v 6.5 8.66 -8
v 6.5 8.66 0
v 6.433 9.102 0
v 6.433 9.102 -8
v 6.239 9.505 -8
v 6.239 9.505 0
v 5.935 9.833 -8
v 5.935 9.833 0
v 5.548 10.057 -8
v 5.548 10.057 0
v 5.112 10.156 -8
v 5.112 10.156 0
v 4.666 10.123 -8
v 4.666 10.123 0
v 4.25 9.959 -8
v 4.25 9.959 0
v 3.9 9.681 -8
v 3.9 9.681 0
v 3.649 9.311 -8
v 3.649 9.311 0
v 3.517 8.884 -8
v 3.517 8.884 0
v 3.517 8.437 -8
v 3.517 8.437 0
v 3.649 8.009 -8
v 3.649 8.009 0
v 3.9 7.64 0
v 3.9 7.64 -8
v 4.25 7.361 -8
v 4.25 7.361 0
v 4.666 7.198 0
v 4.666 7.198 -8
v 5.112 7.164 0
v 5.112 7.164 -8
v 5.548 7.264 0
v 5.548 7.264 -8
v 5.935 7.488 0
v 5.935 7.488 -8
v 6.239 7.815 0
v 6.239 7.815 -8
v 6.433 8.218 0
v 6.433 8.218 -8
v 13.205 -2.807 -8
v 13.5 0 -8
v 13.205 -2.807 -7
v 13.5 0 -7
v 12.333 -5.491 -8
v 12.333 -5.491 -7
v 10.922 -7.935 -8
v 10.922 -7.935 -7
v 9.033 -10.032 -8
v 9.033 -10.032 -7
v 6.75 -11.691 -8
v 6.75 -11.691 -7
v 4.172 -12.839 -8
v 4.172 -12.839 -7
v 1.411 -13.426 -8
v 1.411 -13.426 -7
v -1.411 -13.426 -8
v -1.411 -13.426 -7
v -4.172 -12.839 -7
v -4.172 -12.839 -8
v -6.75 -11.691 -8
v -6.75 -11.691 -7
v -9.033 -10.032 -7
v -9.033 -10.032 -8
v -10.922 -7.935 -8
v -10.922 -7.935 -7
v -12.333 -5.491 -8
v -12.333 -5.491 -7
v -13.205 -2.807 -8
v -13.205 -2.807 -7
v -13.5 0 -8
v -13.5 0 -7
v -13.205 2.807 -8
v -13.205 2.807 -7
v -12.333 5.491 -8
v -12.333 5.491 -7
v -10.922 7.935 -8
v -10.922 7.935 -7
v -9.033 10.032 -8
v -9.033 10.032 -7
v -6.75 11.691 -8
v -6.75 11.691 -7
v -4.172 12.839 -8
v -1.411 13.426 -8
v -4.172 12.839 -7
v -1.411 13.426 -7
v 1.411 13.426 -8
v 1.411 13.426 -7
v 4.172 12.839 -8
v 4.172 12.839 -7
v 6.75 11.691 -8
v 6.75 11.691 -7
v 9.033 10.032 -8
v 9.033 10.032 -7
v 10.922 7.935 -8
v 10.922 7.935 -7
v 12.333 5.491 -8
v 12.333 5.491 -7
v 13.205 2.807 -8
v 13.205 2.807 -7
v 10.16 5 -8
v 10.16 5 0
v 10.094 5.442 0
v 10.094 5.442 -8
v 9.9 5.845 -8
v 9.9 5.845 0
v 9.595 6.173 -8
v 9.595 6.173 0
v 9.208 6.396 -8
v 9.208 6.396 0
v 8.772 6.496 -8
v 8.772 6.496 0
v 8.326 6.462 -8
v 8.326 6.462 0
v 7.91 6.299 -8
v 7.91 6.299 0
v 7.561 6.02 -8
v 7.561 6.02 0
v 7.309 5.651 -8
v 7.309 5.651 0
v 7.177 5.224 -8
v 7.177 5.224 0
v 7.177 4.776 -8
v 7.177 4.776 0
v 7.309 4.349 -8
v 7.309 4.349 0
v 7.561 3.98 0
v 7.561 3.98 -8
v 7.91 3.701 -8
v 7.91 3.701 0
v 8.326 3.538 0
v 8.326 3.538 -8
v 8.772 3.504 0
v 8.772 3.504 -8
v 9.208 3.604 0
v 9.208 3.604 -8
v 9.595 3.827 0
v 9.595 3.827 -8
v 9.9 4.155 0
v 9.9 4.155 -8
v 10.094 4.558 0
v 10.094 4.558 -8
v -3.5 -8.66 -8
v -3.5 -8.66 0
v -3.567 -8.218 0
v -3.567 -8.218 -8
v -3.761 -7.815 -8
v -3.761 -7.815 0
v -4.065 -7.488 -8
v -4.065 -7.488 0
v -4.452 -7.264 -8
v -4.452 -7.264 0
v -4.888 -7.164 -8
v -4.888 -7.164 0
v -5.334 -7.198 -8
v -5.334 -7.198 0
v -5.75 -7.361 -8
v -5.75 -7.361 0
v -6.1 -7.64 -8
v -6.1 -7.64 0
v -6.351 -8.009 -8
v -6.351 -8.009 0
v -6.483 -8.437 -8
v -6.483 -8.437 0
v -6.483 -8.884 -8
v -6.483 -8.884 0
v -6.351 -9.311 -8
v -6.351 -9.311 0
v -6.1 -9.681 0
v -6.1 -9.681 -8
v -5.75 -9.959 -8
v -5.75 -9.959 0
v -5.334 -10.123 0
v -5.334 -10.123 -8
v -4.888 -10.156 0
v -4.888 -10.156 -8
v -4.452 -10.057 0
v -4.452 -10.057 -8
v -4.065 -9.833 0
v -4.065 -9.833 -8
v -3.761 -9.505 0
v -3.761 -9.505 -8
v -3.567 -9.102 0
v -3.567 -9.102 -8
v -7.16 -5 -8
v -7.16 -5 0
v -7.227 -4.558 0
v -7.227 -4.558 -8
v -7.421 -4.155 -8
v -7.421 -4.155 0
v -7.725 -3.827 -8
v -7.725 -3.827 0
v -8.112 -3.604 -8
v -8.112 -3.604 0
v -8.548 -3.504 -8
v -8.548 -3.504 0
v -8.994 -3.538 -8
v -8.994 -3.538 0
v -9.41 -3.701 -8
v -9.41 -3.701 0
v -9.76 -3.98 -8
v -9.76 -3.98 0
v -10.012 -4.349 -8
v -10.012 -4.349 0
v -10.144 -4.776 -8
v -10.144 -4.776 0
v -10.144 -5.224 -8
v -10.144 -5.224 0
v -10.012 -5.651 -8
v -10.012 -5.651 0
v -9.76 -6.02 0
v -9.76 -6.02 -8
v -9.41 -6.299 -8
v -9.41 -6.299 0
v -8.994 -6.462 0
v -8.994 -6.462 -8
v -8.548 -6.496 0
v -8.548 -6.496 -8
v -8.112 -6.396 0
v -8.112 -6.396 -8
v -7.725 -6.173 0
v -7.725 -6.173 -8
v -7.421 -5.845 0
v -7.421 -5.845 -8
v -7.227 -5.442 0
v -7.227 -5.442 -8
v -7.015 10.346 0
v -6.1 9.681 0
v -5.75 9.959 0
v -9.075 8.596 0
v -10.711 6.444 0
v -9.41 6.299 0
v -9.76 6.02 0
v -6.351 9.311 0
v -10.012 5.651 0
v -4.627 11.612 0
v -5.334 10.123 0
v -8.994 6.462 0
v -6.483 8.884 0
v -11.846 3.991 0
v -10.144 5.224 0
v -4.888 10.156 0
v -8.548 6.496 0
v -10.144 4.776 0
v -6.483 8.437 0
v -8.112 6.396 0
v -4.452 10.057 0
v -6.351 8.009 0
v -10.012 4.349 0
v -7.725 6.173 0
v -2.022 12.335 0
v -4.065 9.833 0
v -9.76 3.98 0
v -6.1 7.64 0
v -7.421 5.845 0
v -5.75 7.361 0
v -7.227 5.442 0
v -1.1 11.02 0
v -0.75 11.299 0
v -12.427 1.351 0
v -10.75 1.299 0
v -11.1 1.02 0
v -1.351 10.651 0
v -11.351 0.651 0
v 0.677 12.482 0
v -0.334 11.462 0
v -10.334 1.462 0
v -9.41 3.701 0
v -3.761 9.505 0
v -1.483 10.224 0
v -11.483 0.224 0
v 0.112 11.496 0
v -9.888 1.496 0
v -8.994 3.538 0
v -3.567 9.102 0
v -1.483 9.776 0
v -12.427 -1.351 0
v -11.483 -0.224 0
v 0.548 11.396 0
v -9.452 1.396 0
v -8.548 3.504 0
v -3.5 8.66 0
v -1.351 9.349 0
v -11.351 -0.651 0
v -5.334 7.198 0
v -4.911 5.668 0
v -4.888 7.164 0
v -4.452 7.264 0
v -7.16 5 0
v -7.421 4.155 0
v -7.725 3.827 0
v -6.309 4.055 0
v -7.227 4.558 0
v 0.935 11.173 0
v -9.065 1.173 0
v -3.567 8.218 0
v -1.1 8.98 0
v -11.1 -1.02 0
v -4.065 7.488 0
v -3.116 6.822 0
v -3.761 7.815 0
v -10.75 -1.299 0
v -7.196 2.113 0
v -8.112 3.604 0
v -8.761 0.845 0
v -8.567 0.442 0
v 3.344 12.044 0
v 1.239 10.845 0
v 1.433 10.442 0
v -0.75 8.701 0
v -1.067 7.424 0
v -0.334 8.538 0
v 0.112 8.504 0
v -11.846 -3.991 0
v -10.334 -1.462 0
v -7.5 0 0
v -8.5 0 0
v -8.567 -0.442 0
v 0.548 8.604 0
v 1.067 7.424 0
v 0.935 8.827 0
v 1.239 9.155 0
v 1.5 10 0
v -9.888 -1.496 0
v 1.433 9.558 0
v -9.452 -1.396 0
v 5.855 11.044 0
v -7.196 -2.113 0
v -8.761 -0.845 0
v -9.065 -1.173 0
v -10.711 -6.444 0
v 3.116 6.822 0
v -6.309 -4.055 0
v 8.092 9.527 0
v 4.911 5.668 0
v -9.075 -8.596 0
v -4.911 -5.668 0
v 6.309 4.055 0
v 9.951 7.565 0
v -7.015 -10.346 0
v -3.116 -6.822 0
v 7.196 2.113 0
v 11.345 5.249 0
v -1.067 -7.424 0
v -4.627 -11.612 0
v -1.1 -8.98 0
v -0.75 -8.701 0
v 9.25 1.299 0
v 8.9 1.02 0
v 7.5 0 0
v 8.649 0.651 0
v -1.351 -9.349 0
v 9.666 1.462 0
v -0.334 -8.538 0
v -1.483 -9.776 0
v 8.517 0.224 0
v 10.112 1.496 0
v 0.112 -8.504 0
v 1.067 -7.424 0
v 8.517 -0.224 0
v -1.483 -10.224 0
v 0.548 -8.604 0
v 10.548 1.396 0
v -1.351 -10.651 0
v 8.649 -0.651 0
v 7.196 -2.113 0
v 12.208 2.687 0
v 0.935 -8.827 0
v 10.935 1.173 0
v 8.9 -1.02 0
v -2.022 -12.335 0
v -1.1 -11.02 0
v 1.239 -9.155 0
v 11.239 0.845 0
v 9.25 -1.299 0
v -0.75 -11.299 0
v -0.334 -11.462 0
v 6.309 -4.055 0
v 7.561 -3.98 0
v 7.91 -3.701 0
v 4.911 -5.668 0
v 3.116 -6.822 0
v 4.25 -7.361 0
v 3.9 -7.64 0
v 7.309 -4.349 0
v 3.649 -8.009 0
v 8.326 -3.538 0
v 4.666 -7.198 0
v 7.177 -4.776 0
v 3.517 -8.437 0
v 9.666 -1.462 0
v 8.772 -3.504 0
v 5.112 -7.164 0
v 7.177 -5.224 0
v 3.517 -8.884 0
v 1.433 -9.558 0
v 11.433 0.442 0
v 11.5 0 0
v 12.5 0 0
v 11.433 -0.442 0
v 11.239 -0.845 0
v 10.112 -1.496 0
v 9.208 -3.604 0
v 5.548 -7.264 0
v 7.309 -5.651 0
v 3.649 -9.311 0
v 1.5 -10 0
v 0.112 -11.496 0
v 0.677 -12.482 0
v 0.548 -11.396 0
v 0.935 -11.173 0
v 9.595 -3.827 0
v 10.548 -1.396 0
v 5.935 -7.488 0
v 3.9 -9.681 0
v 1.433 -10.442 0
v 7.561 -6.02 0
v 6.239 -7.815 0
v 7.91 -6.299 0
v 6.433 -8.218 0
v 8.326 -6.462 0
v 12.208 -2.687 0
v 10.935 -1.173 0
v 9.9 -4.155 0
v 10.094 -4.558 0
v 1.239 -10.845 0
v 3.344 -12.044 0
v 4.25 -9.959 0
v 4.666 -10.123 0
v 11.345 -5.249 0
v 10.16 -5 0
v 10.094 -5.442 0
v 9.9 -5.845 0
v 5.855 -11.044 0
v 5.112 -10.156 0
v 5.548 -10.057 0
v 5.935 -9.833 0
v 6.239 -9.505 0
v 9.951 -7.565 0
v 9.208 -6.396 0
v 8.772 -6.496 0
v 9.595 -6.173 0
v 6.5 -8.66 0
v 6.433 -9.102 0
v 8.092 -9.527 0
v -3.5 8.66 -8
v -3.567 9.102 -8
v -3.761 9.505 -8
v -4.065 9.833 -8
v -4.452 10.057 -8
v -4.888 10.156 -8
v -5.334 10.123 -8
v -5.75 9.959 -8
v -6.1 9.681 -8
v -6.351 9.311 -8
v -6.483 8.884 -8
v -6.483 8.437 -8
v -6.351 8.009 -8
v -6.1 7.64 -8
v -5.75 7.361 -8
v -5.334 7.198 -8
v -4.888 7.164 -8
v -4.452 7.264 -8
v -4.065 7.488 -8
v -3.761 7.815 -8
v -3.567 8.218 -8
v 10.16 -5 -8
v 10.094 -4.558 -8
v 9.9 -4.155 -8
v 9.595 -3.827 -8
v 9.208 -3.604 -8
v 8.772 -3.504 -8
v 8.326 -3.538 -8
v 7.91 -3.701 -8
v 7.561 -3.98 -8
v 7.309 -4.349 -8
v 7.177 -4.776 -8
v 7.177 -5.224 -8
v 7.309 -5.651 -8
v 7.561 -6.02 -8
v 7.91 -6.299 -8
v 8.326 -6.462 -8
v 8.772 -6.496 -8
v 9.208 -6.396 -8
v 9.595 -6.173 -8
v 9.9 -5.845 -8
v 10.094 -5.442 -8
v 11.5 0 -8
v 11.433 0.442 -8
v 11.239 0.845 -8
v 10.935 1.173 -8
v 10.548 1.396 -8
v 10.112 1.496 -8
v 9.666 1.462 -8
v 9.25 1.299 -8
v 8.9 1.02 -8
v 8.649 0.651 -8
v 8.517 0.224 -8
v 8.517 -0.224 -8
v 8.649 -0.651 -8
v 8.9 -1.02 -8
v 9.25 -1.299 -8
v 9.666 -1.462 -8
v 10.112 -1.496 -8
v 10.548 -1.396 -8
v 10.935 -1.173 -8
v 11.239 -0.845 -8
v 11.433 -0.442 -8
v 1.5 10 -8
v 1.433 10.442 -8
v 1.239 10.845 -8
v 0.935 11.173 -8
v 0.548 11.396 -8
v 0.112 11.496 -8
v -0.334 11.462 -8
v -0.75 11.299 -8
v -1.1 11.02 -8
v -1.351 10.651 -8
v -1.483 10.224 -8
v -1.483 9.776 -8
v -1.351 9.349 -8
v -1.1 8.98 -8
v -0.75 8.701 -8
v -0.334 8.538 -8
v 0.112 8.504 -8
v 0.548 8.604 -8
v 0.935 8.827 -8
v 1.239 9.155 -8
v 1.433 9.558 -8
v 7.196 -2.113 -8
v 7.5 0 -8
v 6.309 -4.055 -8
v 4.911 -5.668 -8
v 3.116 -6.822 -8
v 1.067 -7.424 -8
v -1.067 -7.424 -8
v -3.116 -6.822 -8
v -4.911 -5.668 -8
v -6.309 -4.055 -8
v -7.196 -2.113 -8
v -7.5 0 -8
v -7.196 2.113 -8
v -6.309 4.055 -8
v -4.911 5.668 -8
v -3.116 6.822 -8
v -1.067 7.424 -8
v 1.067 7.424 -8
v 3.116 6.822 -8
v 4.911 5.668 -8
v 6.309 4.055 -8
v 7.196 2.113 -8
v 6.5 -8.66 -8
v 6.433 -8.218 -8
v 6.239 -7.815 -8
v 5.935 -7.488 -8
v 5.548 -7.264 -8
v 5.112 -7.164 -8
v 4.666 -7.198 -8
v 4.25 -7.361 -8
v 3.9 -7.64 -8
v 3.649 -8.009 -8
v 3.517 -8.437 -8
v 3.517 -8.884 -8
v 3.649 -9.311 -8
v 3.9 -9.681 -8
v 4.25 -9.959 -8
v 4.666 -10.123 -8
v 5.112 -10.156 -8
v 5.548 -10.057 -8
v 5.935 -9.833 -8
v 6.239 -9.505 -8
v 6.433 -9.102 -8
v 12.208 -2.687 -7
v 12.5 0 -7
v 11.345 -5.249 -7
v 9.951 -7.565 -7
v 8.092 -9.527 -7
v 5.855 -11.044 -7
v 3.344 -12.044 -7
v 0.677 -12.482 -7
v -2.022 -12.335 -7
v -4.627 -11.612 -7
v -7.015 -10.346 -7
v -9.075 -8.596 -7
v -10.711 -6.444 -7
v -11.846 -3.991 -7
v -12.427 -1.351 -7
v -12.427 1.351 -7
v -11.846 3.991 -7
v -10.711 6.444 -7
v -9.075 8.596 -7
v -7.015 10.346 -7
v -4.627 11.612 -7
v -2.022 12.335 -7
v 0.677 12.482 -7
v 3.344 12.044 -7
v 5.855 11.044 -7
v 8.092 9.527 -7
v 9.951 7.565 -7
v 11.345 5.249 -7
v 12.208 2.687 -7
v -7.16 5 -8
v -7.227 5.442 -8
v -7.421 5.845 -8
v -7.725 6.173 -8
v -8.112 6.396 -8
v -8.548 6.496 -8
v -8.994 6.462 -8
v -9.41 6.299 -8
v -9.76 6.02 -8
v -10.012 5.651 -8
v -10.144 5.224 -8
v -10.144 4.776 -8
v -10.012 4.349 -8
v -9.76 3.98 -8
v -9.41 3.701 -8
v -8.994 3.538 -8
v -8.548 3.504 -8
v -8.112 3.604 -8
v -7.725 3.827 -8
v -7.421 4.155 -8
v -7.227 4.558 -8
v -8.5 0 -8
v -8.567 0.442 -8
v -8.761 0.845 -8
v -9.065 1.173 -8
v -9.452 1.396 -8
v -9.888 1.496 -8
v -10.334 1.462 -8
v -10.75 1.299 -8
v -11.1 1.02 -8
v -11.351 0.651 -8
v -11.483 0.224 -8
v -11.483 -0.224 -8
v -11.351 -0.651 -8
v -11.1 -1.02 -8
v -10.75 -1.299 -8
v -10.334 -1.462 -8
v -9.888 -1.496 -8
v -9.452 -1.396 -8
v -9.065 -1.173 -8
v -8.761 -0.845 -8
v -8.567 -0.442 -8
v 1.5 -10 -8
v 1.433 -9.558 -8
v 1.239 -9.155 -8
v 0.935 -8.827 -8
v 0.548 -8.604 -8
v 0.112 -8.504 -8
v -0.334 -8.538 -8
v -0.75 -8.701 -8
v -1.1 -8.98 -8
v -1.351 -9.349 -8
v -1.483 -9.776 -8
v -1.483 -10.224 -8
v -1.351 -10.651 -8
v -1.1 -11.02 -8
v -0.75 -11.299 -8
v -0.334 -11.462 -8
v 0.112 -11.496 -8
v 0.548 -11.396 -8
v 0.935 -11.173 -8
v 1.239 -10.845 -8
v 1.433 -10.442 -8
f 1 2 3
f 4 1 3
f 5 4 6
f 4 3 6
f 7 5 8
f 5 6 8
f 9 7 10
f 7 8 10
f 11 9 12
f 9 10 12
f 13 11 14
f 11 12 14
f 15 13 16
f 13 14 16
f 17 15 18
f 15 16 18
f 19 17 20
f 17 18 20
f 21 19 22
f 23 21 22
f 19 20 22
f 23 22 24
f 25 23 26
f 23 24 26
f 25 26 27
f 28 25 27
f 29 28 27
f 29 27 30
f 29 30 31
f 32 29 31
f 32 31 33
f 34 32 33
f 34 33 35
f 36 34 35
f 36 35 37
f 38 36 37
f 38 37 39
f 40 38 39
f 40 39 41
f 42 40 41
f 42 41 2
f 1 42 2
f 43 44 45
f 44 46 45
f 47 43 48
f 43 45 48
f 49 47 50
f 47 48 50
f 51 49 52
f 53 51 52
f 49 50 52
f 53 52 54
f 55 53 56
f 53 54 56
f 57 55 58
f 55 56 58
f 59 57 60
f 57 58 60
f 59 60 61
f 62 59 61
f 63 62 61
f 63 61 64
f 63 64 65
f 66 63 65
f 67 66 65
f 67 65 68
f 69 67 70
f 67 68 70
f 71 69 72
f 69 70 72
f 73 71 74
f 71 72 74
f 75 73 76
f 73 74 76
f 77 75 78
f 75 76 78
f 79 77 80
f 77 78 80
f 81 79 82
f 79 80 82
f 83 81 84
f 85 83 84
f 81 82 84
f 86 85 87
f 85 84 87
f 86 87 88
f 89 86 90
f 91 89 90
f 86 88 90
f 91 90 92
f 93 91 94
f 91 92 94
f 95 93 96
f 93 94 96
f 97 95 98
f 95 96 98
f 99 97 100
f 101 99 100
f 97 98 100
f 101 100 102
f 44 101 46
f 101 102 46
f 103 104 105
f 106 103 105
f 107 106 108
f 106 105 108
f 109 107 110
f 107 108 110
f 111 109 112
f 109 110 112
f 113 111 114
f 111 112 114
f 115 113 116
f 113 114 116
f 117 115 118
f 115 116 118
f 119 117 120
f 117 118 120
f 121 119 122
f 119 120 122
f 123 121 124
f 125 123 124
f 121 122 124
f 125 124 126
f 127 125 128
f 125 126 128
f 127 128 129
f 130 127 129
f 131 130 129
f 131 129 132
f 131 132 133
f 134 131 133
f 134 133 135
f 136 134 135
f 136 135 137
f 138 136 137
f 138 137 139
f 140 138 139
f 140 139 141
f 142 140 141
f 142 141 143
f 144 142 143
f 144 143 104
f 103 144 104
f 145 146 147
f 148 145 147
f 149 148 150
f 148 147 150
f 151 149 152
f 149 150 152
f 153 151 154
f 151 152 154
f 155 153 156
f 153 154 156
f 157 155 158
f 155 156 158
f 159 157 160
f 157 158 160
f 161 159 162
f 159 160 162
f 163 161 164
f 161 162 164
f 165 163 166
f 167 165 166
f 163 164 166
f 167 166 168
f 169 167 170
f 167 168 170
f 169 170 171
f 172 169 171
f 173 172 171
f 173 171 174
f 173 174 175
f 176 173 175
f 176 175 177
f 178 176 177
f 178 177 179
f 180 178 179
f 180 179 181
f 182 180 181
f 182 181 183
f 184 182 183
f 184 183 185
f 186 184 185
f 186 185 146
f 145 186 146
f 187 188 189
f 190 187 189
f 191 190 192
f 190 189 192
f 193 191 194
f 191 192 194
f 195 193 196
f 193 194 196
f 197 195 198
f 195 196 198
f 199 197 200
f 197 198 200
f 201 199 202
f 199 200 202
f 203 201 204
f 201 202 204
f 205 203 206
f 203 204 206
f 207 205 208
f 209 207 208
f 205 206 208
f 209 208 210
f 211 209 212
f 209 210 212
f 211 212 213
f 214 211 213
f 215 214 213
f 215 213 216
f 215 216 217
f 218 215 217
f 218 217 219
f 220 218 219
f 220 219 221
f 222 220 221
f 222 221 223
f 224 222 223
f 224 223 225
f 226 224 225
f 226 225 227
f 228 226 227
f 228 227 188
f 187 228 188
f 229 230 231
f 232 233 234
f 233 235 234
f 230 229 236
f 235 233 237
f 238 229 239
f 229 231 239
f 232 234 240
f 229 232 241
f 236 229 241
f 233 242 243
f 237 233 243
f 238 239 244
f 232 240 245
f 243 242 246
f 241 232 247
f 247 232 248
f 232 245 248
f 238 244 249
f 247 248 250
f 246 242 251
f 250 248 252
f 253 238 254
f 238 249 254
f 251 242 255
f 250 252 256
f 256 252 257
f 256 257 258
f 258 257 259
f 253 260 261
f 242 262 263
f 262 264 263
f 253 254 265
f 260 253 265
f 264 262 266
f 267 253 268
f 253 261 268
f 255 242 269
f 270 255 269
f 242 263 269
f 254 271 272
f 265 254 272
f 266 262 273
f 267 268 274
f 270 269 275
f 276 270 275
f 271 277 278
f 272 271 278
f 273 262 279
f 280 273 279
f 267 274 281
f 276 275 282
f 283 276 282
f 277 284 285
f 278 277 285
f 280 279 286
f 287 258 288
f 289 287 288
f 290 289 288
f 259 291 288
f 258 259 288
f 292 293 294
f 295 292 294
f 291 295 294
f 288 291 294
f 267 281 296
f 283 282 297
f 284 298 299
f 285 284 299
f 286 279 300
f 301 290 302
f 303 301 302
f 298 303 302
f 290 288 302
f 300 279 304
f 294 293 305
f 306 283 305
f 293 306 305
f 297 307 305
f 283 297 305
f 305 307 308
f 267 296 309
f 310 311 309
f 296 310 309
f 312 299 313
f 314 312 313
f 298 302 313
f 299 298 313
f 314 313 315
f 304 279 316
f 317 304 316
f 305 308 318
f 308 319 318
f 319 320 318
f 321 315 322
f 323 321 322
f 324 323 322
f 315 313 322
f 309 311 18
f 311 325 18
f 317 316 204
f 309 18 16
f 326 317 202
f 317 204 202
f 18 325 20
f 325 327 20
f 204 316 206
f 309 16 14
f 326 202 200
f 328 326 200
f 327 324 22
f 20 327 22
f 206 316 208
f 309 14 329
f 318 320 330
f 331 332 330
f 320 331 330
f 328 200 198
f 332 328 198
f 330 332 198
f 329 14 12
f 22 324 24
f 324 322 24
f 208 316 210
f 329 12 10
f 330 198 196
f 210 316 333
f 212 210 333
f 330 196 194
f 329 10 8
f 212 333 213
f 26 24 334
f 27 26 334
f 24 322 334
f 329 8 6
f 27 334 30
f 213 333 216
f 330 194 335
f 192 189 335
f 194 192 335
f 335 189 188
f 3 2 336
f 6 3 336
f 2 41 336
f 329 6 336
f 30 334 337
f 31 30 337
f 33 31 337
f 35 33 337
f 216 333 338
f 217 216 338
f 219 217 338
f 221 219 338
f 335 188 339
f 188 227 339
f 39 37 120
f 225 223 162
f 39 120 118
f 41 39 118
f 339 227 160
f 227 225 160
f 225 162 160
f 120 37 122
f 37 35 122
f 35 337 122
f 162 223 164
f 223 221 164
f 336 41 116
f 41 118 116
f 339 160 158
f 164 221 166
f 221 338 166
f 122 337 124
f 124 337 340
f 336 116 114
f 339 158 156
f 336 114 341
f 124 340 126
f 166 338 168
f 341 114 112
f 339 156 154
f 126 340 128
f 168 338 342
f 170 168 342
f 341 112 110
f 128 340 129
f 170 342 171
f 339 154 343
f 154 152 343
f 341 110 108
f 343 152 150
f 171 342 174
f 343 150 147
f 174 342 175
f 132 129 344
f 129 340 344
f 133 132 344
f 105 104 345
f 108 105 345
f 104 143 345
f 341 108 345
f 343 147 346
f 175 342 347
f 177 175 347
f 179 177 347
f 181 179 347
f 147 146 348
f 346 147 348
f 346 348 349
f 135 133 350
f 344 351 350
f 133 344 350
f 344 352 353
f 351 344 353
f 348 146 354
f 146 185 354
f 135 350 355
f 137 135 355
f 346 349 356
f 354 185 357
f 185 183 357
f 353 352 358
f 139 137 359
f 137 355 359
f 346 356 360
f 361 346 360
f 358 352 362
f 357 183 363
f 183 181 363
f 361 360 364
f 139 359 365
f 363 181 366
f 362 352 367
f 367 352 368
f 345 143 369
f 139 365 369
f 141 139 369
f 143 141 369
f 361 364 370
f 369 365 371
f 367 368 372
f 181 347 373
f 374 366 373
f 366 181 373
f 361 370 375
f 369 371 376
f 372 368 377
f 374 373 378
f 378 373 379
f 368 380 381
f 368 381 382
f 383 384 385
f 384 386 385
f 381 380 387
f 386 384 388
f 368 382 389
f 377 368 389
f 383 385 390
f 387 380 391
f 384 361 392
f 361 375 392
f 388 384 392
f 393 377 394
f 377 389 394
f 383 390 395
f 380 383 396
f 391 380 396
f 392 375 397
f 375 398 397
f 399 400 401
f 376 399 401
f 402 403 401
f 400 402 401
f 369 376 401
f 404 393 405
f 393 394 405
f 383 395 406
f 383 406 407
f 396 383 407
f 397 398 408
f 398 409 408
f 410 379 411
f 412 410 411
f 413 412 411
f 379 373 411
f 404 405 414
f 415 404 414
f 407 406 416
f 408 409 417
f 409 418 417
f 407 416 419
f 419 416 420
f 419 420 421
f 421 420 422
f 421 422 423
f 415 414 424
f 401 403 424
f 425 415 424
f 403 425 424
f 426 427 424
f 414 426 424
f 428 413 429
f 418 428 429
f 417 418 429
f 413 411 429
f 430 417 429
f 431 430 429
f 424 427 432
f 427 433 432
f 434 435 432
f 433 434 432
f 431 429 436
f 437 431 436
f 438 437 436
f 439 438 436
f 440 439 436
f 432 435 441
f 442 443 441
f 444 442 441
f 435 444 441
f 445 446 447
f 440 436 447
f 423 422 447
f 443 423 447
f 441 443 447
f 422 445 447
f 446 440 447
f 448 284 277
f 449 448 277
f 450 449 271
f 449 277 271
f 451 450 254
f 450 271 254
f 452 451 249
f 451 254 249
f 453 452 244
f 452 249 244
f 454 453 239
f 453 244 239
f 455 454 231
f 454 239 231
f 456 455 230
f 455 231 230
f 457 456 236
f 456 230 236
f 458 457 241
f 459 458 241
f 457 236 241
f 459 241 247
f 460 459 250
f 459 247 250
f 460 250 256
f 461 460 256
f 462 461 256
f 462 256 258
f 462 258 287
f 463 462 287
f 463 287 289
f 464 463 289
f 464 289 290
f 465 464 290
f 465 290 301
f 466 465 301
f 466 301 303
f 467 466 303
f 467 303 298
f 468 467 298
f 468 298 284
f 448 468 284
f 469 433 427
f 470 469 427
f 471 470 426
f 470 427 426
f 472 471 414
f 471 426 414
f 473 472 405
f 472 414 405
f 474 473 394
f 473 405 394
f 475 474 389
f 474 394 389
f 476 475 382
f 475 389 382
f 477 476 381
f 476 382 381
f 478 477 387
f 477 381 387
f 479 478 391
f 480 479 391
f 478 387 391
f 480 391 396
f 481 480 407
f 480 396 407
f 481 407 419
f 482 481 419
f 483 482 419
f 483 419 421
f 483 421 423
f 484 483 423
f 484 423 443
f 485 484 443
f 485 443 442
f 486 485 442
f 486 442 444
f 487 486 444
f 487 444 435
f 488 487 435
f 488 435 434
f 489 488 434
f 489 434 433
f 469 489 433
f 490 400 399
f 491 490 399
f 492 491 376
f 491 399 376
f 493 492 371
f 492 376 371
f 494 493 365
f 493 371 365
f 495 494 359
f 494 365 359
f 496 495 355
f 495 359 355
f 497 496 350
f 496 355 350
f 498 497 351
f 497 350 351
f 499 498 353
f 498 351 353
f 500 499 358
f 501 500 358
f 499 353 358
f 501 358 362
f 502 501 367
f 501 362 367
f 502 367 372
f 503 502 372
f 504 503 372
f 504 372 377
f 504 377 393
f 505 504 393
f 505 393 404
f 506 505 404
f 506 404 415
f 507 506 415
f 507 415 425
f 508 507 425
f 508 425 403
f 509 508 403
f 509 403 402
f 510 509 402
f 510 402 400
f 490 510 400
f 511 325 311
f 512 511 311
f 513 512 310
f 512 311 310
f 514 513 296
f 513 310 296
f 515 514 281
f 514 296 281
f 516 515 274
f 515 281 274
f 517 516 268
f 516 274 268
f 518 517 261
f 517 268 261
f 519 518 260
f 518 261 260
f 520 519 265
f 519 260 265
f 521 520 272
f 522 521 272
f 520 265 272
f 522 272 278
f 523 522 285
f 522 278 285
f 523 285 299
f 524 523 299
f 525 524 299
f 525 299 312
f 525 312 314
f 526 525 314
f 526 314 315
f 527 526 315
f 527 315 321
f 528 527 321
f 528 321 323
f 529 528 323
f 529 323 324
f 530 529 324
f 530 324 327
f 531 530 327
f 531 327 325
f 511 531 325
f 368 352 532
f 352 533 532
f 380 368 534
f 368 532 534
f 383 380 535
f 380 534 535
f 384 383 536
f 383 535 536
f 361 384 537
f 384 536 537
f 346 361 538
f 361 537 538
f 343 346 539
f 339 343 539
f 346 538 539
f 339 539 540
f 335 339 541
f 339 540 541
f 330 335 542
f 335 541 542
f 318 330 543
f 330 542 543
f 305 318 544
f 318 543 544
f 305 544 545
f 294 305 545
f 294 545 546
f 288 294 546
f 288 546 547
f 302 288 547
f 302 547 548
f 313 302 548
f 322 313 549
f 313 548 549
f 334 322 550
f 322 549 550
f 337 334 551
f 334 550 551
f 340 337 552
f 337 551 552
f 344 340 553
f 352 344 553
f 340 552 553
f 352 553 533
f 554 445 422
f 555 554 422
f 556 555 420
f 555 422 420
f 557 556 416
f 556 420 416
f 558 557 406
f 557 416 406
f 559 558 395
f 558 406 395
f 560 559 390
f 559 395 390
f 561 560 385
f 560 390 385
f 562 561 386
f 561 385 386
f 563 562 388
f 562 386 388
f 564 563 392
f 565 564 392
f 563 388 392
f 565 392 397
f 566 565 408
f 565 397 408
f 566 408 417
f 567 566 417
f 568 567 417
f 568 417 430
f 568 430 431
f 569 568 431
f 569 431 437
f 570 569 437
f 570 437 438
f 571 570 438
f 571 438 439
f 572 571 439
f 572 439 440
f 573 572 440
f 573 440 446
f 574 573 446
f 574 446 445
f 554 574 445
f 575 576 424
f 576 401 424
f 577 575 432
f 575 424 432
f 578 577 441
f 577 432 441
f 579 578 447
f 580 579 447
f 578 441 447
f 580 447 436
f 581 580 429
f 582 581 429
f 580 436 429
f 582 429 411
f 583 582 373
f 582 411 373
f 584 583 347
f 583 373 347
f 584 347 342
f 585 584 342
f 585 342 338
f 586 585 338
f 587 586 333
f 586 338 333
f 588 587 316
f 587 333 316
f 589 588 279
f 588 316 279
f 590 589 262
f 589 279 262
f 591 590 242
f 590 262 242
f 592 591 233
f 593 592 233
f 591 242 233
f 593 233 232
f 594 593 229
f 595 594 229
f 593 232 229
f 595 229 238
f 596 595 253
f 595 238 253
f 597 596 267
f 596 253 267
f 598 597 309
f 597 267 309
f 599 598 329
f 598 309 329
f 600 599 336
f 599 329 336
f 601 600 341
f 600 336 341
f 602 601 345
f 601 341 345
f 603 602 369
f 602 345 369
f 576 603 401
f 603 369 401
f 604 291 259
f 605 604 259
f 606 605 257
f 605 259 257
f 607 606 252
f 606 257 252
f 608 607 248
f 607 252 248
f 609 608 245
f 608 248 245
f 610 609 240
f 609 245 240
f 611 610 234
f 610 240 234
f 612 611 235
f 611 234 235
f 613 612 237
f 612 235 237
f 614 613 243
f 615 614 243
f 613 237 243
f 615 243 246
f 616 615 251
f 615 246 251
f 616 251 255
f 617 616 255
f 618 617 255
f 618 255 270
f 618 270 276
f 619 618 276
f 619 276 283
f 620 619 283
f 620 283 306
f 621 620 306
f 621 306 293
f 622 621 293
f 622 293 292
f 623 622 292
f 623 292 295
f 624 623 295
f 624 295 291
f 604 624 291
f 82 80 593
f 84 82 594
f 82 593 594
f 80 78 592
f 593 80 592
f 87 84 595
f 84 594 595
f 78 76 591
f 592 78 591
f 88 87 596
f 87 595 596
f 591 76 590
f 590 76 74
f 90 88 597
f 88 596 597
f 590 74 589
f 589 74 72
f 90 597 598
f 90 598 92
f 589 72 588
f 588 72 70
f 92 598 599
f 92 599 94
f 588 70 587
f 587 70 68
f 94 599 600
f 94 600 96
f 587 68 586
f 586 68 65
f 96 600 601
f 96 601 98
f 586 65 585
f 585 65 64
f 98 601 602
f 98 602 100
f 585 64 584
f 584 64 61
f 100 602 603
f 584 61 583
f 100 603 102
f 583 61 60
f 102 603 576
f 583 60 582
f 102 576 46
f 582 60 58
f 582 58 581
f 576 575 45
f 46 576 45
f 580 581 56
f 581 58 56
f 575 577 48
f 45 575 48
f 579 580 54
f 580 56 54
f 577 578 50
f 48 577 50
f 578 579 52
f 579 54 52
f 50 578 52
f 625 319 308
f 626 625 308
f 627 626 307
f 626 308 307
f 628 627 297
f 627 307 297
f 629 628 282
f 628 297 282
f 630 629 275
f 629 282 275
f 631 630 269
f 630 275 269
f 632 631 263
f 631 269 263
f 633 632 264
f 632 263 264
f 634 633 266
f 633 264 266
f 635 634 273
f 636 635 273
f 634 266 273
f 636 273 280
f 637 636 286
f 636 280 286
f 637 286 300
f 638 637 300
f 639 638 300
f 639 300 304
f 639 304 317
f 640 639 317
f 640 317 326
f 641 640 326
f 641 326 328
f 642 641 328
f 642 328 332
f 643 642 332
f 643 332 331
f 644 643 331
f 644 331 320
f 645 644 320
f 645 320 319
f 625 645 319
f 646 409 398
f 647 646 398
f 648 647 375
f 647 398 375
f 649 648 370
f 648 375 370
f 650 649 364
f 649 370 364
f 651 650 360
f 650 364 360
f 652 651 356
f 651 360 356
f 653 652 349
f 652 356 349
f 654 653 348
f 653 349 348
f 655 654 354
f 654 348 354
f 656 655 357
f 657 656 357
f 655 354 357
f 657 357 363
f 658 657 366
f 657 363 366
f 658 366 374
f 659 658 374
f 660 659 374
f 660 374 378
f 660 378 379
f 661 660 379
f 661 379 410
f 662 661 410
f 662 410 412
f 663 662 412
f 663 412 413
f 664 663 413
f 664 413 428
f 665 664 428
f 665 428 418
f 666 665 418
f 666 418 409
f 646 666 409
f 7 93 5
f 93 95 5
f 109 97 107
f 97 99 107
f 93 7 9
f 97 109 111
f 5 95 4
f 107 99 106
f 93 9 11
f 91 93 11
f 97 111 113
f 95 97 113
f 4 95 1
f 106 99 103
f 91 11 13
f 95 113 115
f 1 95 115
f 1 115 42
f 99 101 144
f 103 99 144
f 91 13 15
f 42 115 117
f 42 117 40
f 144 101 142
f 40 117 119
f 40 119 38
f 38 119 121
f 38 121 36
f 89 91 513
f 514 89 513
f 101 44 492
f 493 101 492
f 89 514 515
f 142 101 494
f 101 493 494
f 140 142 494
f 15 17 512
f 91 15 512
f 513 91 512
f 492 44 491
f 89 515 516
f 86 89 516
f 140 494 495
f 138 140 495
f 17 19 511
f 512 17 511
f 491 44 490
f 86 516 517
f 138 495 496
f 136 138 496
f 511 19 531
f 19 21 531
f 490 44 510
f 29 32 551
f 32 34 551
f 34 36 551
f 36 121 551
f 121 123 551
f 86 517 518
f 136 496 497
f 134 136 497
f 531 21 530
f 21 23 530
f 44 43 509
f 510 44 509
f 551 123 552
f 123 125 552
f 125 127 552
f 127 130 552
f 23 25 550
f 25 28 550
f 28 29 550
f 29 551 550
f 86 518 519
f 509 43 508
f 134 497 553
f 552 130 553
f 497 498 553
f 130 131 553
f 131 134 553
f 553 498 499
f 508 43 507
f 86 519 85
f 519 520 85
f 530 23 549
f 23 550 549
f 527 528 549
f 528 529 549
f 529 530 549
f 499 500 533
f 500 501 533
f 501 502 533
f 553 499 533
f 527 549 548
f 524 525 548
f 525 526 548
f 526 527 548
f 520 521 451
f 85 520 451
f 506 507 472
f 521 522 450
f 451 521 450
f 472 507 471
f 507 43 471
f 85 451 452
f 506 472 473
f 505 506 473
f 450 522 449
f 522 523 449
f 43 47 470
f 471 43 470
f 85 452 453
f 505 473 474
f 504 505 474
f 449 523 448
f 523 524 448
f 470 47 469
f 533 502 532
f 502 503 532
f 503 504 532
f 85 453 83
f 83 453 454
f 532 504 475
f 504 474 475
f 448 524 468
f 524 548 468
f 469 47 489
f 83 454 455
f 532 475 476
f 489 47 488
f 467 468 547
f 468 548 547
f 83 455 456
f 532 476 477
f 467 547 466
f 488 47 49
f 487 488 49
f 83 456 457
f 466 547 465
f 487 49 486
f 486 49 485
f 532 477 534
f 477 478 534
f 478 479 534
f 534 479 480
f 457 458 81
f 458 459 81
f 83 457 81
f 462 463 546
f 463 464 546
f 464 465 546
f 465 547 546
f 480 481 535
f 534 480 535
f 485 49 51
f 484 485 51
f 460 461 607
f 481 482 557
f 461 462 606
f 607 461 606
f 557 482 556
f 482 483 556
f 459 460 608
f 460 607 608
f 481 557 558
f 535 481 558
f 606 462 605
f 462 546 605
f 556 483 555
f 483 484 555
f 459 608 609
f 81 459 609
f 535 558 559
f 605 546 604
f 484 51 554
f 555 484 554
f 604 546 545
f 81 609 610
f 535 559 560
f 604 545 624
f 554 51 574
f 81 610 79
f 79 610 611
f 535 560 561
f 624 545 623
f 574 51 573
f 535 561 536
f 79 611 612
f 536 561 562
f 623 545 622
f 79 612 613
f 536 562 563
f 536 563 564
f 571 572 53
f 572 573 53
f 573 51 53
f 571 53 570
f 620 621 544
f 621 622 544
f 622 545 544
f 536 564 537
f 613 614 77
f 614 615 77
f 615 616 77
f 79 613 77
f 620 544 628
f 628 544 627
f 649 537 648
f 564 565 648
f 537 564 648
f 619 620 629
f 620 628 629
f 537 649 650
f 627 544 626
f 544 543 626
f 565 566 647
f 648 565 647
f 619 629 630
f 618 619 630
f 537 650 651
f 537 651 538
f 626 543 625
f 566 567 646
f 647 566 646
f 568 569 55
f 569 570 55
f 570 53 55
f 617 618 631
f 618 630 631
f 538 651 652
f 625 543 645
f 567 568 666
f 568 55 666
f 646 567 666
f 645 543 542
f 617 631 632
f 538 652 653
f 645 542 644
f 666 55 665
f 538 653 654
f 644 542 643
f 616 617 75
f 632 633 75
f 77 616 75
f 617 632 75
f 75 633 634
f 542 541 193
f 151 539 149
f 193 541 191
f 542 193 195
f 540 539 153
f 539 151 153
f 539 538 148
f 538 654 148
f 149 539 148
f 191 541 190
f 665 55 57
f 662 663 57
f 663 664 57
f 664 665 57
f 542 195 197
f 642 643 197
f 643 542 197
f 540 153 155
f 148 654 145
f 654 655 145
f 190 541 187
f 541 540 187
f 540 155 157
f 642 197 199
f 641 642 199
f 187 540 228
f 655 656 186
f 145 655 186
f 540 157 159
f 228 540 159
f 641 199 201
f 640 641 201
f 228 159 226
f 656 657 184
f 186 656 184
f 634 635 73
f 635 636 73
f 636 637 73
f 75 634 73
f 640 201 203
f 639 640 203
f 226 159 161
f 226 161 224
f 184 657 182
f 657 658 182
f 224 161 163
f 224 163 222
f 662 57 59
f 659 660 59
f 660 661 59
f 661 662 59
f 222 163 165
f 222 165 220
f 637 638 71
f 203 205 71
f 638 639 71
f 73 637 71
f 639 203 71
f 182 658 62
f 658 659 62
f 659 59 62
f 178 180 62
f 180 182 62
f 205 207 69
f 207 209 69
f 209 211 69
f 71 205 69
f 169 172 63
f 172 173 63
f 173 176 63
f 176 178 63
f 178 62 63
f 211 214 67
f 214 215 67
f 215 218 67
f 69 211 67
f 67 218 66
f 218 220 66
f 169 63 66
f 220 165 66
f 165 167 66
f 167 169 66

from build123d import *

# Parameters (mm, degrees)
SKETCH_2_R          = 1.5
CUT_EXTRUDE_1_DEPTH = 21.700241544


with BuildPart() as part:
    # ｽｹｯﾁ1 → 回転1 (revolve)
    with BuildSketch(Plane(origin=(0, 0, 0), x_dir=(0, 0, -1), z_dir=(1, 0, 0)), mode=Mode.PRIVATE) as revolve_1_sk:
        Polygon((0, 7.5), (8, 7.5), (8, 13.5), (7, 13.5), (7, 12.5), (0, 12.5), align=None)
    revolve(revolve_1_sk.sketch.rotate(Axis((0, 0, 0), (0, 0, -1)), 90), axis=Axis((0, 0, 0), (0, 0, -1)))

    # ｽｹｯﾁ2 → ｶｯﾄ - 押し出し1 (cut, through all)
    with BuildSketch(Plane.XY):
        with Locations((0, 10)):
            Circle(SKETCH_2_R)
        with Locations((5, 8.660254038)):
            Circle(SKETCH_2_R)
        with Locations((8.660254038, 5)):
            Circle(SKETCH_2_R)
        with Locations((10, 0)):
            Circle(SKETCH_2_R)
        with Locations((8.660254038, -5)):
            Circle(SKETCH_2_R)
        with Locations((5, -8.660254038)):
            Circle(SKETCH_2_R)
        with Locations((0, -10)):
            Circle(SKETCH_2_R)
        with Locations((-5, -8.660254038)):
            Circle(SKETCH_2_R)
        with Locations((-8.660254038, -5)):
            Circle(SKETCH_2_R)
        with Locations((-10, 0)):
            Circle(SKETCH_2_R)
        with Locations((-8.660254038, 5)):
            Circle(SKETCH_2_R)
        with Locations((-5, 8.660254038)):
            Circle(SKETCH_2_R)
    extrude(amount=-CUT_EXTRUDE_1_DEPTH, mode=Mode.SUBTRACT)


solid = part.part
